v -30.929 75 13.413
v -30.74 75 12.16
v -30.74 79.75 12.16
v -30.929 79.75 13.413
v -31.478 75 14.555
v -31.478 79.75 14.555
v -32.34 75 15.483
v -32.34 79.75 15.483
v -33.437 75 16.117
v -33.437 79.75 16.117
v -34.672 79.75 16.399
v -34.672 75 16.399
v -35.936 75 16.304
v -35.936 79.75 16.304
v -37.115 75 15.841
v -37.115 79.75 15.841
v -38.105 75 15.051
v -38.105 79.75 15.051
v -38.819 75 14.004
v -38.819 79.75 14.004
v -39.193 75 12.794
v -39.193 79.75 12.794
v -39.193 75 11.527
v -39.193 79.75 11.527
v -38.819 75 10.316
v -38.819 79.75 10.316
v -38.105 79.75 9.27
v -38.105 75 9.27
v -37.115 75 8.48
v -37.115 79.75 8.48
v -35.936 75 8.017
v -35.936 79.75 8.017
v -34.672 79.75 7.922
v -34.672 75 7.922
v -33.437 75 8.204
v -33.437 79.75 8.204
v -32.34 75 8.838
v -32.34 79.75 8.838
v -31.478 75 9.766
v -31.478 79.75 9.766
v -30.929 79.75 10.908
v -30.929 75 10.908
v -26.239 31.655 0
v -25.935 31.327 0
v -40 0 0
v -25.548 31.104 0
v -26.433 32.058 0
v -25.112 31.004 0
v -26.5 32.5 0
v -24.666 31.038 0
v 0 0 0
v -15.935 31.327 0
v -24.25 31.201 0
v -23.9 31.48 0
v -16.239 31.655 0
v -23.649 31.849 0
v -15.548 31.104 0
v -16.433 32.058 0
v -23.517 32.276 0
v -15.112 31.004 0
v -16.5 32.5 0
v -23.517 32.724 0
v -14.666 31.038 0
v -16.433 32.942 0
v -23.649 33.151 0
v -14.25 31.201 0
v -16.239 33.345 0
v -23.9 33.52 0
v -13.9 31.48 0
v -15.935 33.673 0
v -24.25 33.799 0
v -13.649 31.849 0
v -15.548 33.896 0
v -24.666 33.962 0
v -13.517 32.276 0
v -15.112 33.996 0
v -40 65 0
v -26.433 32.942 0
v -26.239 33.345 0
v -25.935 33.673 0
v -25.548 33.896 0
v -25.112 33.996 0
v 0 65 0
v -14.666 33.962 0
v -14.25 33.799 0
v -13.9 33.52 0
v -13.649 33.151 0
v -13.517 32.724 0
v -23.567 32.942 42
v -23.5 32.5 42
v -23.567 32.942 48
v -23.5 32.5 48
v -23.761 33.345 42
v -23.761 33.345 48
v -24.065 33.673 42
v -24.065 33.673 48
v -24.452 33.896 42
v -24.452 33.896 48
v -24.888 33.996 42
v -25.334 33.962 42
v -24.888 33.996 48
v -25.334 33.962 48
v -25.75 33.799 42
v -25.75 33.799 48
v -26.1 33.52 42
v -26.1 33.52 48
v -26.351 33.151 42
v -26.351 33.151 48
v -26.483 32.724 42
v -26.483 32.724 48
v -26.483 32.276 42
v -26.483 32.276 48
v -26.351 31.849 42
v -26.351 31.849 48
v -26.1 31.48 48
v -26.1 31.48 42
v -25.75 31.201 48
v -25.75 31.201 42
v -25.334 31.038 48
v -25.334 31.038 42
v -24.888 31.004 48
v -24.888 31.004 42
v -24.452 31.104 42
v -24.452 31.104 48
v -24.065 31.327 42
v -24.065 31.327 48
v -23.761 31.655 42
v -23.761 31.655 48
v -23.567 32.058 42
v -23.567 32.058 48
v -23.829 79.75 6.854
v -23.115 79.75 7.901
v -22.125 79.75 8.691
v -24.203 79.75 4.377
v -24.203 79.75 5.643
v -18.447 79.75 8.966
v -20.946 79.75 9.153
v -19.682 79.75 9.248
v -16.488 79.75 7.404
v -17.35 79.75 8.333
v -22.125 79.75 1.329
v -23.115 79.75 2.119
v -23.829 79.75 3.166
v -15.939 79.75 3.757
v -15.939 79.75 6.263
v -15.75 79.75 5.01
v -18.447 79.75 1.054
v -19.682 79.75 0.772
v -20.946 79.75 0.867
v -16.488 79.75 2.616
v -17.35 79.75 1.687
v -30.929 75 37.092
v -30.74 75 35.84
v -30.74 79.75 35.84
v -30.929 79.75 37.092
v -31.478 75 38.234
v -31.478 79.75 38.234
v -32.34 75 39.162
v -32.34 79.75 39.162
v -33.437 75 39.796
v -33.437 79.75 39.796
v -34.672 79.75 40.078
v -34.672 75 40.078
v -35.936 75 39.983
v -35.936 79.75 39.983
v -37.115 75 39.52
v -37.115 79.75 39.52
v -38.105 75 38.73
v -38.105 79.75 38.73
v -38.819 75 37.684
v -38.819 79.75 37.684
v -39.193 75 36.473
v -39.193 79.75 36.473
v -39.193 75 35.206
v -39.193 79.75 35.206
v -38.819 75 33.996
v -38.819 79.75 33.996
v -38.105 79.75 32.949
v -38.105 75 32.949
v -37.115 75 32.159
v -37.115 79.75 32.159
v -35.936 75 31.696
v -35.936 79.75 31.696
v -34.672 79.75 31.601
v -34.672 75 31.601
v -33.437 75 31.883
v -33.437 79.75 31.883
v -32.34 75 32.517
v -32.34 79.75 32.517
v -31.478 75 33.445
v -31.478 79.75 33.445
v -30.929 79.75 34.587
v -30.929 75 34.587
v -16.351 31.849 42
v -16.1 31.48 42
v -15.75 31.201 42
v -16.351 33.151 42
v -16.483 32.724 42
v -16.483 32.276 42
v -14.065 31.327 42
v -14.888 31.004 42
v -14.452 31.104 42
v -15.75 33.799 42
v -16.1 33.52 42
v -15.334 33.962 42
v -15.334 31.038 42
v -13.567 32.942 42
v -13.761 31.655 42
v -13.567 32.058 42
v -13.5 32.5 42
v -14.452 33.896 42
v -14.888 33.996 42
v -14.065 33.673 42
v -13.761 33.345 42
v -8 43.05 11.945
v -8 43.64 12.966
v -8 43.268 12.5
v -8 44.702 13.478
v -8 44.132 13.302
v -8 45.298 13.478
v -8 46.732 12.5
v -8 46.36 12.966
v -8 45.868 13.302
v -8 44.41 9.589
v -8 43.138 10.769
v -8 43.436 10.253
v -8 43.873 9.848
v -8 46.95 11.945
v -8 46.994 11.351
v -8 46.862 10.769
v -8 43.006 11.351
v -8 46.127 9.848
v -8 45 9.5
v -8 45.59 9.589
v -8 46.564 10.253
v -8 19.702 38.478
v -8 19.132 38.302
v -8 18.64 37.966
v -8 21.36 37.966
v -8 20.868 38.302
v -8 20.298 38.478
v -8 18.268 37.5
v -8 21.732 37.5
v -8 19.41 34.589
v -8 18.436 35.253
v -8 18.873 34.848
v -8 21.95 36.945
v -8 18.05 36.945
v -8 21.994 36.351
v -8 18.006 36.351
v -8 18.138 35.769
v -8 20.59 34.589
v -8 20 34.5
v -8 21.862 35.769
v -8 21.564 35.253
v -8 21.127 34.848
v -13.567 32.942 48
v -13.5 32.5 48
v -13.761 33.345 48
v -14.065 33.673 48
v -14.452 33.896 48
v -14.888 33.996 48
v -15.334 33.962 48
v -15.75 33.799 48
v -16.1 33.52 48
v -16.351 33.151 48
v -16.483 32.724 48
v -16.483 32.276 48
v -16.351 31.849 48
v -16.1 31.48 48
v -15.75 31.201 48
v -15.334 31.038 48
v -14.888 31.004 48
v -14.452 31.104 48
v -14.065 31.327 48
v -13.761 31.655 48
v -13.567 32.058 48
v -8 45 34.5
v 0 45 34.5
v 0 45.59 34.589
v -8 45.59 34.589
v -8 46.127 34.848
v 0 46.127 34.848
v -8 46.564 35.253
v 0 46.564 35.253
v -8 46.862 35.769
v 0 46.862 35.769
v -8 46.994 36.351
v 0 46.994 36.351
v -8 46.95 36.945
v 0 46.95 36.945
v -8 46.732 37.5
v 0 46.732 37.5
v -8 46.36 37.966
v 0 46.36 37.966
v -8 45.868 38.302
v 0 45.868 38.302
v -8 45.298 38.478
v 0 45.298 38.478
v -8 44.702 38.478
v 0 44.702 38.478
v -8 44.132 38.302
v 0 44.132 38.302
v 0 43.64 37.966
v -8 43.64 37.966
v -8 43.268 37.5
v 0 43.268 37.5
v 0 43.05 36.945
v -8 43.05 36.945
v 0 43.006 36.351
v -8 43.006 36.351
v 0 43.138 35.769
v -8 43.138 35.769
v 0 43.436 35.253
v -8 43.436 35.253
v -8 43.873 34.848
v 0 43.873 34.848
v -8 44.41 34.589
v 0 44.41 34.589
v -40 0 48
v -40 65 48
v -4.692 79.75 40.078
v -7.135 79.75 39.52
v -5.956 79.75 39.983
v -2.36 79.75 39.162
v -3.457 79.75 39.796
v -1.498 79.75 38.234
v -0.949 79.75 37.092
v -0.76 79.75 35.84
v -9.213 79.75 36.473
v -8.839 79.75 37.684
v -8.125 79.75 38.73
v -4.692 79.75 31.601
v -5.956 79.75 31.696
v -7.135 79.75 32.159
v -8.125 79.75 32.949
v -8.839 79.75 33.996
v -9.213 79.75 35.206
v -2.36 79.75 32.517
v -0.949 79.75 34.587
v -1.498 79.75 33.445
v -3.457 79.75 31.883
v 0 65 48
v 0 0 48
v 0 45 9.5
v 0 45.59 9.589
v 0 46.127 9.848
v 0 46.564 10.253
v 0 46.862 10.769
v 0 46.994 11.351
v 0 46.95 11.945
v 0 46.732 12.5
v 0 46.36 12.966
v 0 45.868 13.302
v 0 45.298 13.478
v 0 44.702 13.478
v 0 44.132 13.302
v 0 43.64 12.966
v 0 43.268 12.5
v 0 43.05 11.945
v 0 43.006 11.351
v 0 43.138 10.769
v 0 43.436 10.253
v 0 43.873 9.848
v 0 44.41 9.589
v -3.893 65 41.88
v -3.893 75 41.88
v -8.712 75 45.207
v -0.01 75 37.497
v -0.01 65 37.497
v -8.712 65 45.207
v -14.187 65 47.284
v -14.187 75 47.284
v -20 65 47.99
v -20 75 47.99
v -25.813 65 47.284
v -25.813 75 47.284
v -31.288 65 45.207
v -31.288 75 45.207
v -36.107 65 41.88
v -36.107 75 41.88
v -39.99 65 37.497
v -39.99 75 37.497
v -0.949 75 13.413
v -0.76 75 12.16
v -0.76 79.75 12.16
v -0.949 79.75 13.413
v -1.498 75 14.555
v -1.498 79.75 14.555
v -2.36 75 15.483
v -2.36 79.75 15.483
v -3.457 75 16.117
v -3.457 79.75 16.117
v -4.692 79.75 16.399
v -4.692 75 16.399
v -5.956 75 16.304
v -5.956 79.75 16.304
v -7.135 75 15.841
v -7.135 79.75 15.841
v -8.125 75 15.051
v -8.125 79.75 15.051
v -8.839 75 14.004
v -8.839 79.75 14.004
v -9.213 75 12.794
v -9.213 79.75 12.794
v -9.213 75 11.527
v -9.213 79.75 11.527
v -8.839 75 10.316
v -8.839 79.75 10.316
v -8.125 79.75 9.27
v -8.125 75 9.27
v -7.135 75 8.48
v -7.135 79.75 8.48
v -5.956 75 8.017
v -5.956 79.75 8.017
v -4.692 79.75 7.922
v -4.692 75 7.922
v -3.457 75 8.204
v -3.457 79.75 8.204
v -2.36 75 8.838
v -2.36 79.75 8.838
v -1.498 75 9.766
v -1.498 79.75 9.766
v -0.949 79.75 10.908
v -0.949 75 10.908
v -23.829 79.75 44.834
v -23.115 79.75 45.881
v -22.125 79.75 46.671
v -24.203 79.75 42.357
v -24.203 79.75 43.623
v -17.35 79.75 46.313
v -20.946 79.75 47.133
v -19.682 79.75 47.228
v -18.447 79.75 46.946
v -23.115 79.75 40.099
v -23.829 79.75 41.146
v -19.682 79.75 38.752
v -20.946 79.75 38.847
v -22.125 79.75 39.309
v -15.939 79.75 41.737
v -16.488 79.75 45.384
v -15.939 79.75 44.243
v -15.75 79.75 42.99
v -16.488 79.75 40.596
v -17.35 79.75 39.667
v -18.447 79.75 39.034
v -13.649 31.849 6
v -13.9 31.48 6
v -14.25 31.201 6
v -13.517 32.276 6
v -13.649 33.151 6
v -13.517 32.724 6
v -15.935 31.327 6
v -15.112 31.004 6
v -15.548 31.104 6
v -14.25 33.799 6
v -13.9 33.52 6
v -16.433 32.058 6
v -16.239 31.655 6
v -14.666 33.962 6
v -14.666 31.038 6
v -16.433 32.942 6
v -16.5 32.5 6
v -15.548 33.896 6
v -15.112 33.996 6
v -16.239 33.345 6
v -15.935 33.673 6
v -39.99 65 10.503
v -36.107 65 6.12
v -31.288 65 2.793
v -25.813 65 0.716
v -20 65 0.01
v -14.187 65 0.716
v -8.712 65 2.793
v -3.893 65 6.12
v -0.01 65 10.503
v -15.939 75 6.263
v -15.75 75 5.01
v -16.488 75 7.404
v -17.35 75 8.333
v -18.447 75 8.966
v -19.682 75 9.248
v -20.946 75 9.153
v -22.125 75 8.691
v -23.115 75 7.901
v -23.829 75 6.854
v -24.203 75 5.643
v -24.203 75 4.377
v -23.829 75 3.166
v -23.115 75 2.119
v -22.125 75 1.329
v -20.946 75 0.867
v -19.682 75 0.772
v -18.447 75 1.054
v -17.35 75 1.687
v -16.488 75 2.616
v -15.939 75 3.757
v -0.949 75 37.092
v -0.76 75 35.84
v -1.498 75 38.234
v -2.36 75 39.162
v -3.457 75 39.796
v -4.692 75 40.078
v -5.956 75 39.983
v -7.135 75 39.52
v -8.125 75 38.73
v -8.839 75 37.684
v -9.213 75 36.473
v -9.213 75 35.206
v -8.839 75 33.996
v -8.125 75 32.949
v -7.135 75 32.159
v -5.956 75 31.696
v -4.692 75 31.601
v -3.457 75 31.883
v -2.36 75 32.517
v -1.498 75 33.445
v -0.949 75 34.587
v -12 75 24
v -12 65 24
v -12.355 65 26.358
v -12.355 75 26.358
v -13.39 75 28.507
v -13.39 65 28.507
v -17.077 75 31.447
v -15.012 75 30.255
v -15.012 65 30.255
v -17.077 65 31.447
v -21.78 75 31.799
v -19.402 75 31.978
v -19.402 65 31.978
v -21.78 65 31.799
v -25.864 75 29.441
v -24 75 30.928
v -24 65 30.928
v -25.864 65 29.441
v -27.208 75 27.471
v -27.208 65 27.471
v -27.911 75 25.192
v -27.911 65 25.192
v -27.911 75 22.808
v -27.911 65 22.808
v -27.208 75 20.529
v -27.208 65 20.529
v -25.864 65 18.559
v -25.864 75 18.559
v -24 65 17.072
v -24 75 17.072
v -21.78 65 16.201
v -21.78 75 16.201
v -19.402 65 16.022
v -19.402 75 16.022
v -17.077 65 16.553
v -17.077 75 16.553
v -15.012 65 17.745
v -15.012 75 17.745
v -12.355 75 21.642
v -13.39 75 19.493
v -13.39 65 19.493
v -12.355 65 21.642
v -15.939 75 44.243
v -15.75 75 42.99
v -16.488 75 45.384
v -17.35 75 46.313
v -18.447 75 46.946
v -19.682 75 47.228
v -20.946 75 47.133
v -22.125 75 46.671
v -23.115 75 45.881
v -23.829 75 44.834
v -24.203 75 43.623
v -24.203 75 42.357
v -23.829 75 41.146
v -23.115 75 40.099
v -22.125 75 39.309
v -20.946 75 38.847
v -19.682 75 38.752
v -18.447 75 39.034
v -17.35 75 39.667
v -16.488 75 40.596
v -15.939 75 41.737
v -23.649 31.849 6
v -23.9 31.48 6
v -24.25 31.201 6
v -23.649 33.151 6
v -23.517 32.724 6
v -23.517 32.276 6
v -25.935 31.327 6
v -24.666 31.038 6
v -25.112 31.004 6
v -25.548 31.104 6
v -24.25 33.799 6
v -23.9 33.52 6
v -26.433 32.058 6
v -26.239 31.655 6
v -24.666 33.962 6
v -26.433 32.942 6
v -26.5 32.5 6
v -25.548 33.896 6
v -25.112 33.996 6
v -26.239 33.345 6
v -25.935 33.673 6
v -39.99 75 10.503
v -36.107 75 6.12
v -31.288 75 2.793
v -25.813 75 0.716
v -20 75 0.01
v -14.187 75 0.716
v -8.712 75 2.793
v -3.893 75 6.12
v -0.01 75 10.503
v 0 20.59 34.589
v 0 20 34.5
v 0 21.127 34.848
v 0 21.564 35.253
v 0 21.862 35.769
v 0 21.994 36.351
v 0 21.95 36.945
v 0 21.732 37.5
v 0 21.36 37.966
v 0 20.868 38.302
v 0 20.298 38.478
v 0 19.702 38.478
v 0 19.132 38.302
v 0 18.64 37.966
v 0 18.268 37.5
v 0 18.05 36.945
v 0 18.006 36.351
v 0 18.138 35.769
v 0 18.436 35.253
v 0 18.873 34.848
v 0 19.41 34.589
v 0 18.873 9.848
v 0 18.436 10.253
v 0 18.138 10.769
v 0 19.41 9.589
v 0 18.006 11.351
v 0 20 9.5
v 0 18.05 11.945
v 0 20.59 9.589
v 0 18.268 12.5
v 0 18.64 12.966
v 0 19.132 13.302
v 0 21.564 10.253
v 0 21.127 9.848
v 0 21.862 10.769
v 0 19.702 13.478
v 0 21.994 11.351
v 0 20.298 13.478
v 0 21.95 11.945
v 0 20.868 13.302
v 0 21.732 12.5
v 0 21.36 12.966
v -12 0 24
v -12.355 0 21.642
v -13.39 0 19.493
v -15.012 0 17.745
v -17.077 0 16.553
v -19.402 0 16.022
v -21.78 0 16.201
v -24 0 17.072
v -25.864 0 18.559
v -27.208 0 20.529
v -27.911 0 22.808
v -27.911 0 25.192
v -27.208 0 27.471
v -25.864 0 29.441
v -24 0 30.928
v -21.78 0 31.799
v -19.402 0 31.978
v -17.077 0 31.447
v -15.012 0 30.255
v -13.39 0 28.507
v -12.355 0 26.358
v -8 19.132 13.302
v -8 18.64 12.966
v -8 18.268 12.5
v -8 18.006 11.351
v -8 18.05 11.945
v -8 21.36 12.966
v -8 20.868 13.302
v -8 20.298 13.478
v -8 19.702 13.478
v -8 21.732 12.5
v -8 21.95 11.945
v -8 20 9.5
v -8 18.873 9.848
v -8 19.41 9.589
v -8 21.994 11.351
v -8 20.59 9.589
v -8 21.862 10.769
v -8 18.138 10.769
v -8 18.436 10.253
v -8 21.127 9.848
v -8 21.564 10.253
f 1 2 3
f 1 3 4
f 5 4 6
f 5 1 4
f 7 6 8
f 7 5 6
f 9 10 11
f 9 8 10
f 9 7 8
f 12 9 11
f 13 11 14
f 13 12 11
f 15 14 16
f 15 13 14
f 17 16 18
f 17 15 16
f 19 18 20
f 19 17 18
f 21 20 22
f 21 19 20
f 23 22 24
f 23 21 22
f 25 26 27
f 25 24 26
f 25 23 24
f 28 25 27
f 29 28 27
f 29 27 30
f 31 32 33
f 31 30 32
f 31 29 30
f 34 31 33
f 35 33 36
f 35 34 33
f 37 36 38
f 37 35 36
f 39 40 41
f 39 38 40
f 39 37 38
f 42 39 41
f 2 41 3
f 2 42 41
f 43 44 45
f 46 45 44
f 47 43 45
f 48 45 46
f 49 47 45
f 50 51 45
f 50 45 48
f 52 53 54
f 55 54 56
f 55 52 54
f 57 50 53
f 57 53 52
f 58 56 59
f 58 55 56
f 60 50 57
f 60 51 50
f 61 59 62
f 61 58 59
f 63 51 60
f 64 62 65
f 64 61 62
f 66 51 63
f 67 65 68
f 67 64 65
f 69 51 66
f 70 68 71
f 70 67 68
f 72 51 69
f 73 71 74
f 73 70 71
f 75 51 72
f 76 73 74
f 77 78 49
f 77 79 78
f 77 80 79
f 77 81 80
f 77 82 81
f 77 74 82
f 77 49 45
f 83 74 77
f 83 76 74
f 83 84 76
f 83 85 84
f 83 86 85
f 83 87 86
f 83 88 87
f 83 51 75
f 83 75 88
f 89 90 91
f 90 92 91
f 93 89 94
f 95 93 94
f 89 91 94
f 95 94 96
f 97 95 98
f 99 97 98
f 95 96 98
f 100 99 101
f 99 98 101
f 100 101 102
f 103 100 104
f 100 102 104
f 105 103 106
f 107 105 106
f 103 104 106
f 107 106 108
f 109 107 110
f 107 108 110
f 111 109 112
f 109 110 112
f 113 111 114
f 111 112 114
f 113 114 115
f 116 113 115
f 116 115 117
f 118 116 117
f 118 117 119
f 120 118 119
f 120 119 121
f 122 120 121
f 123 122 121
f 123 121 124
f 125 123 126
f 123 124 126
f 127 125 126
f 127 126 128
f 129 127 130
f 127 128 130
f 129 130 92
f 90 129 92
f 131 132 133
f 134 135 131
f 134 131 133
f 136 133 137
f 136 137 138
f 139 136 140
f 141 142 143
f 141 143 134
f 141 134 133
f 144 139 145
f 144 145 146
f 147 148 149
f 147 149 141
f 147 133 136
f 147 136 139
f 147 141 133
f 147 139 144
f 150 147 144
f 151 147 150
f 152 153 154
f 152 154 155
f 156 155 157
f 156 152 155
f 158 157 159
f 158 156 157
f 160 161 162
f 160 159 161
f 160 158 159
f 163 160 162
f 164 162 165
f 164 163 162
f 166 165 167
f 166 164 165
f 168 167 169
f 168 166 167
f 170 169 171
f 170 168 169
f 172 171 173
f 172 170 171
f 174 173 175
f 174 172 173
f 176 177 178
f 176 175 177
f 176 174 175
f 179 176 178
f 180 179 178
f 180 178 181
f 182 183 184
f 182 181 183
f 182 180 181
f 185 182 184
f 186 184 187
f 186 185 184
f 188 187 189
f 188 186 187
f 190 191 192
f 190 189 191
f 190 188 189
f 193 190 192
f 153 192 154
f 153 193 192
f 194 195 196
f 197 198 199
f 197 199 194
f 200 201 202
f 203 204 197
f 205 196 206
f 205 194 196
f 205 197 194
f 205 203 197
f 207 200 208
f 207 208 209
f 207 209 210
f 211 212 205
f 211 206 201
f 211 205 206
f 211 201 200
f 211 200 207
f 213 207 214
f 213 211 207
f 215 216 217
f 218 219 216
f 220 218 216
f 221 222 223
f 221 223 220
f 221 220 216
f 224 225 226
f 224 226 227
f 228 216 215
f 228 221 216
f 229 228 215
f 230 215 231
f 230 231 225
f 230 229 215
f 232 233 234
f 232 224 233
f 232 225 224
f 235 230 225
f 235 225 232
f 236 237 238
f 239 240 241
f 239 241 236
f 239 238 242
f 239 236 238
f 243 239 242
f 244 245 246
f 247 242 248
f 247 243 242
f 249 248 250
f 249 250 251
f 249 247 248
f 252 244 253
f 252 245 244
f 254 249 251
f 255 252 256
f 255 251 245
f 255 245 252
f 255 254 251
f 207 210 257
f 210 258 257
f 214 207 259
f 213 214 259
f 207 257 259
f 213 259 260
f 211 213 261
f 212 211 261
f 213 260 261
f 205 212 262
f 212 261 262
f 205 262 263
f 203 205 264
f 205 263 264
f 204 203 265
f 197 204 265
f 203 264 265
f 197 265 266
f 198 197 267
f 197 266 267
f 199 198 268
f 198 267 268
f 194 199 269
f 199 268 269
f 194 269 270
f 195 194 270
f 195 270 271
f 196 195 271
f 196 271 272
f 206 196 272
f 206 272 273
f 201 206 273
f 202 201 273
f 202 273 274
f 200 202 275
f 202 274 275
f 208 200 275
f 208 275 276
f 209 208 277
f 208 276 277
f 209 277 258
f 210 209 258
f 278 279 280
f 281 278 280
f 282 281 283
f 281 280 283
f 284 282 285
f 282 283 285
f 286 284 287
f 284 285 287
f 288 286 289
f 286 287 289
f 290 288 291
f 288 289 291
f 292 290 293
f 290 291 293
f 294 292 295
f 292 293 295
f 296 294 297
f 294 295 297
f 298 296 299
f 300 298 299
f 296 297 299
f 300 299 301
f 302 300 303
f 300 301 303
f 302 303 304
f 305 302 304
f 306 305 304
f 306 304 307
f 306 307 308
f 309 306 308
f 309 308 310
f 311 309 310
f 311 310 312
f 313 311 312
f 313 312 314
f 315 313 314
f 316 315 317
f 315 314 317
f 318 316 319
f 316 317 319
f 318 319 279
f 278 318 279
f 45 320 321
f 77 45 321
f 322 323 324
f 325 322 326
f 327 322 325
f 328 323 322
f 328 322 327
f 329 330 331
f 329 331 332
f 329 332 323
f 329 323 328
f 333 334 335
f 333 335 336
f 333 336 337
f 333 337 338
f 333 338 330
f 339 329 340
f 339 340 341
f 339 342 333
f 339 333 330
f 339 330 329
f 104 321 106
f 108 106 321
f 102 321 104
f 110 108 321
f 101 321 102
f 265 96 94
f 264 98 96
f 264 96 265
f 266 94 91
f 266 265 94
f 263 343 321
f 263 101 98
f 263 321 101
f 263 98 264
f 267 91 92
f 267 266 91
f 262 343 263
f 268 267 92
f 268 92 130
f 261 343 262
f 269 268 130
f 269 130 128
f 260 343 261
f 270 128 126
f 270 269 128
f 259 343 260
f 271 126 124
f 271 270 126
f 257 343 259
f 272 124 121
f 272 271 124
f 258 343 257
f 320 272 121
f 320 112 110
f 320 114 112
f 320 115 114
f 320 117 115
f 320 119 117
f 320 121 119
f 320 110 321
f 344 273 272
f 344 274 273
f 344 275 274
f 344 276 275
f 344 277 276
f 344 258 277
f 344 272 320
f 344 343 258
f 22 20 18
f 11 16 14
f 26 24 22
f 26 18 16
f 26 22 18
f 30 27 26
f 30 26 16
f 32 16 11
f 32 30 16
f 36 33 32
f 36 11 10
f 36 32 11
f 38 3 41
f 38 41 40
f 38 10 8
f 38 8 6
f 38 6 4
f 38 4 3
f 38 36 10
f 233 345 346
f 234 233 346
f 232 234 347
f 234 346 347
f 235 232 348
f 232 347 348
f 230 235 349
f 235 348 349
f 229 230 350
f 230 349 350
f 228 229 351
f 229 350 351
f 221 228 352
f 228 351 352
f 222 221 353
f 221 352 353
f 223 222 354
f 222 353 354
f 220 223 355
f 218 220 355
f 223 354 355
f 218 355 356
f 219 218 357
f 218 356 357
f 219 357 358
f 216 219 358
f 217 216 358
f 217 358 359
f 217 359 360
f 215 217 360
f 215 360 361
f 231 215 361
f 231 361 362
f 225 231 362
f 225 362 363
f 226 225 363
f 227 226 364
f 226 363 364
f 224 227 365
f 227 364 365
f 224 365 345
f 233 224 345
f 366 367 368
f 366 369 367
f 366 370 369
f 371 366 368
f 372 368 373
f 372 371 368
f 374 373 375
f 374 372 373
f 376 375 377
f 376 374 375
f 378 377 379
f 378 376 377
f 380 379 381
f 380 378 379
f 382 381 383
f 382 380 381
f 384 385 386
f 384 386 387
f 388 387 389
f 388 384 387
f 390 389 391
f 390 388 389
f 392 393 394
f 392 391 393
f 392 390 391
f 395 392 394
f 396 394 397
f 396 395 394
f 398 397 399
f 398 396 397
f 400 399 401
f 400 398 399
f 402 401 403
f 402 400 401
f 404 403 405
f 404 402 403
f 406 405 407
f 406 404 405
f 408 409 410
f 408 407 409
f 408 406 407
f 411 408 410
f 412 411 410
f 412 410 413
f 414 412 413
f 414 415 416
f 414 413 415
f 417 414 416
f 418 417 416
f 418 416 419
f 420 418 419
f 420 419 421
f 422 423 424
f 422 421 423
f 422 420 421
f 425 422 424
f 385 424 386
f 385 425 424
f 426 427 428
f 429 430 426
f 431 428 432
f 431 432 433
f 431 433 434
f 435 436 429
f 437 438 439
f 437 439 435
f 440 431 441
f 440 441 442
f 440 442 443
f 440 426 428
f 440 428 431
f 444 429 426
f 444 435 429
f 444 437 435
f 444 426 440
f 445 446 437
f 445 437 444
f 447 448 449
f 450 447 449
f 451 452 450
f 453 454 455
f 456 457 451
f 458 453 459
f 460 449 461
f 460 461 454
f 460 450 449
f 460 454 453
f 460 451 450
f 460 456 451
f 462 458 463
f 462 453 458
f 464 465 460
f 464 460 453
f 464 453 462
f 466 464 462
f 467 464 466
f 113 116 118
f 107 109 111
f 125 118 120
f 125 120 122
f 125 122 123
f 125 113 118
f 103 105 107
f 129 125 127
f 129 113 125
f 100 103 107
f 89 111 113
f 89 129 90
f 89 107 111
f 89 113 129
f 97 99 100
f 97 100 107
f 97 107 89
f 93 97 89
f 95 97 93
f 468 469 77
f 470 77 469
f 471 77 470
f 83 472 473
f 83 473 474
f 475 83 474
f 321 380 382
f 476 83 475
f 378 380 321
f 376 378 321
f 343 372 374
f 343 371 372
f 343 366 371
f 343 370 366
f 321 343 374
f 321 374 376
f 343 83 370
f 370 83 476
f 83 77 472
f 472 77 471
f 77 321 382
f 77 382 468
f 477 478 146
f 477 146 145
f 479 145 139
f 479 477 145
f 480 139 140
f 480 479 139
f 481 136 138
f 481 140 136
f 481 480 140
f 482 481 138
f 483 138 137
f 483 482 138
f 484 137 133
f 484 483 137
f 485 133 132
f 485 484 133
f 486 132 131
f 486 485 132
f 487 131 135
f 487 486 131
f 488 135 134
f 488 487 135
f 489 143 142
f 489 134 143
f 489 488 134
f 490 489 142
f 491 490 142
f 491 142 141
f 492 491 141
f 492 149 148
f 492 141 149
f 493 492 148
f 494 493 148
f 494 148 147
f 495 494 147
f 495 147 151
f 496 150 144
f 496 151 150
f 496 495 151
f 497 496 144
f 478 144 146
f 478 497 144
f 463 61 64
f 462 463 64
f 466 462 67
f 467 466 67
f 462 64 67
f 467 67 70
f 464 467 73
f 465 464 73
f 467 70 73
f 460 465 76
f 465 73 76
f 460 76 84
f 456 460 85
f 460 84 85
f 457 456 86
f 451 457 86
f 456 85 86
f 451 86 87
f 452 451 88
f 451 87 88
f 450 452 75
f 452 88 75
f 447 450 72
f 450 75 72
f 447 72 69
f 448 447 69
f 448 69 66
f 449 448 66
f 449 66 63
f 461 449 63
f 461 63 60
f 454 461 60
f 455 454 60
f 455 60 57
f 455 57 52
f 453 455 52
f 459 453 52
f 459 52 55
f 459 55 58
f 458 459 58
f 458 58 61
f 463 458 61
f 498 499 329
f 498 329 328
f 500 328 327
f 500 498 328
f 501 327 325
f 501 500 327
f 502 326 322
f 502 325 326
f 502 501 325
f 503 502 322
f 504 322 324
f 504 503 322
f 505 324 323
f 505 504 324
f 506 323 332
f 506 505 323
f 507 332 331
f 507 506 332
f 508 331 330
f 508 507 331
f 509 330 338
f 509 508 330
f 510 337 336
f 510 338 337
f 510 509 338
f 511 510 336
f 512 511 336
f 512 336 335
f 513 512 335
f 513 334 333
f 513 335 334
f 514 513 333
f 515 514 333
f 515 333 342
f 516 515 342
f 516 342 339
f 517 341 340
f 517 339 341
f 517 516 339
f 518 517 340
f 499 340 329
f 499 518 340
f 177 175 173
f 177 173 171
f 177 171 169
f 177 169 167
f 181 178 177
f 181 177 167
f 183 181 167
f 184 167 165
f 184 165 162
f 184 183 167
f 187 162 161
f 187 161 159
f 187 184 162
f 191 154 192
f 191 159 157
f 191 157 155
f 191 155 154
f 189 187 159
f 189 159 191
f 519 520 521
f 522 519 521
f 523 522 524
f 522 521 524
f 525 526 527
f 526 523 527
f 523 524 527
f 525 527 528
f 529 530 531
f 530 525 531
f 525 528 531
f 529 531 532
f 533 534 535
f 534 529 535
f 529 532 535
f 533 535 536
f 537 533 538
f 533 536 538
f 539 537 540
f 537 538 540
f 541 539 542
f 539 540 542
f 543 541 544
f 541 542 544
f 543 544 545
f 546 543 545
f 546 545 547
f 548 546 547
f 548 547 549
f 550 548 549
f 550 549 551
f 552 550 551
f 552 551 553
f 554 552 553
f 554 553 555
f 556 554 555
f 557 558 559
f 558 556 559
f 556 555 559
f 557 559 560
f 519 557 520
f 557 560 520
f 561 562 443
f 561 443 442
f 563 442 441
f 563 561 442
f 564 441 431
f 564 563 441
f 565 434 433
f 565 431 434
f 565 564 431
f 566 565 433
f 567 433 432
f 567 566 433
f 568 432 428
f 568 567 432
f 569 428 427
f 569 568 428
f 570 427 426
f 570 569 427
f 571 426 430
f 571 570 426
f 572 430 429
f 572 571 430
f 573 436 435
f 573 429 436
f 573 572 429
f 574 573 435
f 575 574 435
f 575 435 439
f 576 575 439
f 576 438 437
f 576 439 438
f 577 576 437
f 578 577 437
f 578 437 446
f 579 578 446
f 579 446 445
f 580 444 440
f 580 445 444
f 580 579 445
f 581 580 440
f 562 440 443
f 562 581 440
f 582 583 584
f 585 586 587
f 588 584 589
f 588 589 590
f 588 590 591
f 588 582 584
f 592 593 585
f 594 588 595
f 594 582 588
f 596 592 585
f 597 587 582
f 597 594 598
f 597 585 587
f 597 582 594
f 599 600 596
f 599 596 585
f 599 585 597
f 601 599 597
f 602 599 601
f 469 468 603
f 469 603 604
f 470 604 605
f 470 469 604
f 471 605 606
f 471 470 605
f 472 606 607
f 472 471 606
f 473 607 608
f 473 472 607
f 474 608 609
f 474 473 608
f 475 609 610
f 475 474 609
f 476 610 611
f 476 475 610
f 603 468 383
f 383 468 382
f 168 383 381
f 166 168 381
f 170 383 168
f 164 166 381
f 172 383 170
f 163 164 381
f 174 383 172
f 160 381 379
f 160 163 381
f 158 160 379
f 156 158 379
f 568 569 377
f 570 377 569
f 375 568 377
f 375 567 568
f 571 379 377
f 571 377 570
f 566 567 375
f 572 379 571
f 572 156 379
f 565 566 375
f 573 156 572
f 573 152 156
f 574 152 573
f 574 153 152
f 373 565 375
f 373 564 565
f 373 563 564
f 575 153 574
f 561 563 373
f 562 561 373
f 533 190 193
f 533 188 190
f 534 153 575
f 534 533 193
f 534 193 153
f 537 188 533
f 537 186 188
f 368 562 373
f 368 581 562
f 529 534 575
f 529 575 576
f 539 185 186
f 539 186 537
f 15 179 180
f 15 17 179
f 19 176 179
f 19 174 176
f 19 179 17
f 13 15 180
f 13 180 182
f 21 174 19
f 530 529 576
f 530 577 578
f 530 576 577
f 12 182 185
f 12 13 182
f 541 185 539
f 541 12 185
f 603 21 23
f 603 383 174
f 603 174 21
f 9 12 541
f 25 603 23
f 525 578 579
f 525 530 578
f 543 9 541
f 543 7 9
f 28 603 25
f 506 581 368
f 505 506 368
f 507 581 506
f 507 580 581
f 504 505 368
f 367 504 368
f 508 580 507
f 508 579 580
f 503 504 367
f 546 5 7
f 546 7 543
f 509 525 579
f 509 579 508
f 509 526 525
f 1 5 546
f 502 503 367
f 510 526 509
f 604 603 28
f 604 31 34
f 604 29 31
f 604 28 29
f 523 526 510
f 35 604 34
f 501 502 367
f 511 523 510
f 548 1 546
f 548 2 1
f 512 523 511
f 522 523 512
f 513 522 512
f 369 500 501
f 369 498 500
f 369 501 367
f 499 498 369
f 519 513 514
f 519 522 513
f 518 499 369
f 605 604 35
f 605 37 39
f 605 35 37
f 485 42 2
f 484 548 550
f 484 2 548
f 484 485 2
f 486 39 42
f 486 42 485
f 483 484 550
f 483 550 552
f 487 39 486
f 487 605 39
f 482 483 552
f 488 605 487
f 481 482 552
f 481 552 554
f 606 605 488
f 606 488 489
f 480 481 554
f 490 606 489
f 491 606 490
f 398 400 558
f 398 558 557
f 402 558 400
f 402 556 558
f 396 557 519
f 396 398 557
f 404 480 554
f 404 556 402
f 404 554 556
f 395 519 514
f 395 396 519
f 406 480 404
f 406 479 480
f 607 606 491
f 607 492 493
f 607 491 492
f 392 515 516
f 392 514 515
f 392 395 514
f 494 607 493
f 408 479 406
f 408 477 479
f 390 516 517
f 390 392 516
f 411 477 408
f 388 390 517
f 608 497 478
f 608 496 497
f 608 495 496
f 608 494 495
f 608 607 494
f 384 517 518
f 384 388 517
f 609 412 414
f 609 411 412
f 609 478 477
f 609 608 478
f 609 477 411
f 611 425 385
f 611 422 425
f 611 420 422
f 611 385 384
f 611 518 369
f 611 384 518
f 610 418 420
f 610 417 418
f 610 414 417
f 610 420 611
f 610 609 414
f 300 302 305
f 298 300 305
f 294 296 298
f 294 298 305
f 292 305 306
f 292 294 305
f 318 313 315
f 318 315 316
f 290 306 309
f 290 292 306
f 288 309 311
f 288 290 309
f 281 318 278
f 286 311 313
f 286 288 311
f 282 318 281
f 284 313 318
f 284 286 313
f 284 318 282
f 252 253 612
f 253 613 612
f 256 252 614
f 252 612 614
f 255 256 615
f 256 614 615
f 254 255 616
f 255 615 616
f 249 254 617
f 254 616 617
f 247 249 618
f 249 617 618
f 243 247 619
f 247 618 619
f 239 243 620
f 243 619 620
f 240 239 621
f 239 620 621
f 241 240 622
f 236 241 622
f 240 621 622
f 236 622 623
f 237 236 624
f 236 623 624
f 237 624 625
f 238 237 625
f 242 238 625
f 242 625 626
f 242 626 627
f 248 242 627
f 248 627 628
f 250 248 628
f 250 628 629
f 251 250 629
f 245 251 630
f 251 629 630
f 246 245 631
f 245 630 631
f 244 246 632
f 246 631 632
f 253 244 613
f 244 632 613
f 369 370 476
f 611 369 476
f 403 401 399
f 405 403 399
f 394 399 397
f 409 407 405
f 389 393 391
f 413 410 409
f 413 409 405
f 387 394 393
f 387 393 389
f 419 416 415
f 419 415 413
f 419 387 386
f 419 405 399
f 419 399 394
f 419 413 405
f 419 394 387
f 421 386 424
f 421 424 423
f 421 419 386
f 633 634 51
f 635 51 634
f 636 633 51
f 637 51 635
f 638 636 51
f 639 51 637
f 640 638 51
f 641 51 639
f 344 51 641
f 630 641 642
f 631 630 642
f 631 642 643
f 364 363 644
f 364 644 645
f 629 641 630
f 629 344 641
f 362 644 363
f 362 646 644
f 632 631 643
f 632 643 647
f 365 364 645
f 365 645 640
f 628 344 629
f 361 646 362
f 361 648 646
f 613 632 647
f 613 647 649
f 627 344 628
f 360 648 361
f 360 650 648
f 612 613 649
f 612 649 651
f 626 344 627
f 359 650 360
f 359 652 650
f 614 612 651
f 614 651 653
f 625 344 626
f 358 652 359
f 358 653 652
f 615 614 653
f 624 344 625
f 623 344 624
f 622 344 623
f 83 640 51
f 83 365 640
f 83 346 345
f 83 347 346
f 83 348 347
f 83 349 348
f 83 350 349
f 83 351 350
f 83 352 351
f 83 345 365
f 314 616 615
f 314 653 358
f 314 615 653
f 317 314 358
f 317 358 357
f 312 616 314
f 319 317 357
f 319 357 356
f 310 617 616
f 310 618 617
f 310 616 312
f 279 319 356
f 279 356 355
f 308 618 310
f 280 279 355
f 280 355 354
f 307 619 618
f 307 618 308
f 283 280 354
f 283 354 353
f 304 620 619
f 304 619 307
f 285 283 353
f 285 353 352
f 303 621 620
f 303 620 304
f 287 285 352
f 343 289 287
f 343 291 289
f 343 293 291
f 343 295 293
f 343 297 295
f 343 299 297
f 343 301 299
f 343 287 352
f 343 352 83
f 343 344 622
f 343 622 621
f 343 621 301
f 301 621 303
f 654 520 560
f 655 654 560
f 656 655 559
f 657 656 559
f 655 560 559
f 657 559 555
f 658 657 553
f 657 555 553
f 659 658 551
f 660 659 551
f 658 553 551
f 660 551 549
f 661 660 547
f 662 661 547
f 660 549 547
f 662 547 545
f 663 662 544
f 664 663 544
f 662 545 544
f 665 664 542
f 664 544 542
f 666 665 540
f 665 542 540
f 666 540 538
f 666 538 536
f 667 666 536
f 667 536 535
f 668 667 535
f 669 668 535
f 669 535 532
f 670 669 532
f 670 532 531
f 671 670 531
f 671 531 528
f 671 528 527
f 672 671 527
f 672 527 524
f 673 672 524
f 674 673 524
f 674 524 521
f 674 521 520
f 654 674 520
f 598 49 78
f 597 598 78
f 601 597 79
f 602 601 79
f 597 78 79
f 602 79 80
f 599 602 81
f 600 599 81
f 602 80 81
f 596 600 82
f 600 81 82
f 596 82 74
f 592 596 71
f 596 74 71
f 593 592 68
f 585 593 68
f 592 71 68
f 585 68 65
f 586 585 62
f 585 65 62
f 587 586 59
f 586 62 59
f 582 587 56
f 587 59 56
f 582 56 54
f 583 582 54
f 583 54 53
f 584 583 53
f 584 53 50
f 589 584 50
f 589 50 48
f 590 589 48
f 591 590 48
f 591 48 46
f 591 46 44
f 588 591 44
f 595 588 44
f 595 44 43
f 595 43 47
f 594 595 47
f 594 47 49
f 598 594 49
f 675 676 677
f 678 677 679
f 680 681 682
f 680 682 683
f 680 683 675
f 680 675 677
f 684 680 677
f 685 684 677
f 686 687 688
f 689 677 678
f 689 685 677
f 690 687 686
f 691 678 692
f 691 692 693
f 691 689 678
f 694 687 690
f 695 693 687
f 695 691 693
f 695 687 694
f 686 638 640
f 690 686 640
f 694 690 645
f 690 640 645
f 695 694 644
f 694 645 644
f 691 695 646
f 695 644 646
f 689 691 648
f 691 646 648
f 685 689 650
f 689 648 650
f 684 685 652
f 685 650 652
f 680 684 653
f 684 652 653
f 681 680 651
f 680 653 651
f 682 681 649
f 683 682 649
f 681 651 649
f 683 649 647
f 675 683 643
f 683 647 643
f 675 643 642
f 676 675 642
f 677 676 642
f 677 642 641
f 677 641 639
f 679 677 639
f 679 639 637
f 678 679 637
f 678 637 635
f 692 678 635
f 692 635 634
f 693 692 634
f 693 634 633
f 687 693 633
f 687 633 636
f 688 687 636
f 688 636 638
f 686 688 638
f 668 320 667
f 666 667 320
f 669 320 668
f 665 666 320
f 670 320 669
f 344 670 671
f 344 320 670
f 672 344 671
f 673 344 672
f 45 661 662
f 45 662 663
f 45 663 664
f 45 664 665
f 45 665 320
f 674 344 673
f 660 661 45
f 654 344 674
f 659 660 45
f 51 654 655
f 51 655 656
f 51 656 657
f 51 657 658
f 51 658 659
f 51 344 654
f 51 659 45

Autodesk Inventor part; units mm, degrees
ref_plane "YZ Plane" through (0, 0, 0) normal (1, 0, 0) x (0, 1, 0)
ref_plane "XZ Plane" through (0, 0, 0) normal (0, 1, 0) x (-1, 0, 0)
ref_plane "XY Plane" through (0, 0, 0) normal (0, 0, 1) x (1, 0, 0)
sketch "Sketch1" plane through (0, 0, 0) normal (1, 0, 0) x (0, 1, 0)
  line L0 (0, 0) -> (65, 0)
  line L1 (65, 0) -> (65, 48)
  line L2 (65, 48) -> (0, 48)
  line L3 (0, 48) -> (0, 0)
  dimension "d0" = 65
  dimension "d1" = 48
extrude "Extrusion1" add sketch "Sketch1" against normal blind 40
sketch "Sketch2" plane through (0, 0, 0) normal (1, 0, 0) x (0, 0, -1)
  line L0 (-36.5, 45) -> (-11.5, 45) construction
  line L1 (-11.5, 45) -> (-11.5, 20) construction
  line L2 (-11.5, 20) -> (-36.5, 20) construction
  line L3 (-36.5, 20) -> (-36.5, 45) construction
  line L4 (-36.5, 45) -> (-36.5, 65) construction
  line L5 (-48, 65) -> (0, 65) construction
  line L6 (-36.5, 45) -> (-48, 45) construction
  line L7 (-48, 0) -> (-48, 65) construction
  line L8 (-11.5, 20) -> (-11.5, 0) construction
  line L9 (0, 0) -> (-48, 0) construction
  line L10 (-11.5, 20) -> (0, 20) construction
  circle A0 centre (-36.5, 45) radius 2
  circle A1 centre (-11.5, 45) radius 2
  circle A2 centre (-11.5, 20) radius 2
  circle A3 centre (-36.5, 20) radius 2
  line L11 (0, 0) -> (0, 65) projected
  dimension "d4" = 25
  dimension "d5" = 25
  dimension "d6" = 4
  dimension "d7" = 4
  dimension "d8" = 4
  dimension "d9" = 4
extrude "Extrusion2" cut sketch "Sketch2" against normal blind 8
sketch "Sketch3" plane through (0, 0, 48) normal (0, 0, 1) x (1, 0, 0)
  line L0 (0, 65) -> (0, 0) construction
  line L1 (0, 32.5) -> (-40, 32.5) construction
  line L2 (-40, 0) -> (-40, 65) construction
  line L3 (-25, 32.5) -> (-15, 32.5) construction
  circle A0 centre (-25, 32.5) radius 1.5
  circle A1 centre (-15, 32.5) radius 1.5
  dimension "d12" = 10
  dimension "d13" = 15
  dimension "d14" = 3
  dimension "d15" = 3
extrude "Extrusion3" cut sketch "Sketch3" against normal blind 6
sketch "Sketch4" plane through (0, 0, 0) normal (0, 0, -1) x (-1, 0, 0)
  circle A0 centre (25, 32.5) radius 1.5 projected
  circle A1 centre (15, 32.5) radius 1.5 projected
  point P0 (0, 0)
extrude "Extrusion4" cut sketch "Sketch4" against normal blind 6
thread "Thread1" size "M3x0.5" class "6H" standard "ANSI Metric M Profile" full length
thread "Thread2" size "M3x0.5" class "6H" standard "ANSI Metric M Profile" full length
thread "Thread3" size "M4x0.7" class "6H" standard "ANSI Metric M Profile" full length
thread "Thread4" size "M4x0.7" class "6H" standard "ANSI Metric M Profile" full length
thread "Thread5" size "M4x0.7" class "6H" standard "ANSI Metric M Profile" full length
thread "Thread6" size "M4x0.7" class "6H" standard "ANSI Metric M Profile" full length
thread "Thread7" size "M3x0.5" class "6H" standard "ANSI Metric M Profile" full length
thread "Thread8" size "M3x0.5" class "6H" standard "ANSI Metric M Profile" full length
sketch "Sketch5" plane through (0, 65, 48) normal (0, 1, 0) x (1, 0, 0)
  line L0 (-40, 48) -> (-40, 0) projected
  line L1 (-40, 10.5) -> (-40, 37.5)
  line L2 (0, 0) -> (0, 48) projected
  line L3 (0, 10.5) -> (0, 37.5)
  line L4 (0, 38.5) -> (-8, 38.5) projected
  arc A0 (-40, 10.5) -> (0, 10.5) centre (-20, 24.2976) ccw
  arc A1 (0, 37.5) -> (-40, 37.5) centre (-20, 23.7024) ccw
  line L5 (-0.01, 10.5031) -> (-0.01, 37.4969)
  arc A2 (-0.01, 37.4969) -> (-39.99, 37.4969) centre (-20, 23.7024) ccw
  line L6 (-39.99, 37.4969) -> (-39.99, 10.5031)
  arc A3 (-39.99, 10.5031) -> (-0.01, 10.5031) centre (-20, 24.2976) ccw
  line L7 (-39.99, 24) -> (-0.01, 24) construction
  circle A4 centre (-20, 24) radius 8
  dimension "d36" = 27
  dimension "d37" = 10.5
  dimension "d38" = 0.01
  dimension "d39" = 16
extrude "Extrusion5" add sketch "Sketch5" along normal blind 10 contours A2 L5 A3 L6
sketch "Sketch6" plane through (0, 75, 48) normal (0, 1, 0) x (1, 0, 0)
  arc A0 (-0.01, 37.4969) -> (-39.99, 37.4969) centre (-20, 23.7024) ccw projected
  line L0 (-39.99, 37.4969) -> (-39.99, 10.5031) projected
  arc A1 (-39.99, 10.5031) -> (-0.01, 10.5031) centre (-20, 24.2976) ccw projected
  line L1 (-0.01, 10.5031) -> (-0.01, 37.4969) projected
  circle A2 centre (-20, 24) radius 8 projected
  arc A3 (-5.01, 35.8396) -> (-34.99, 35.8396) centre (-20, 23.7024) ccw construction
  line L2 (-5.01, 35.8396) -> (-5.01, 12.1604) construction
  arc A4 (-34.99, 12.1604) -> (-5.01, 12.1604) centre (-20, 24.2976) ccw construction
  line L3 (-34.99, 12.1604) -> (-34.99, 35.8396) construction
  circle A5 centre (-34.99, 35.8396) radius 4.25
  circle A6 centre (-20, 42.99) radius 4.25
  circle A7 centre (-5.01, 35.8396) radius 4.25
  circle A8 centre (-5.01, 12.1604) radius 4.25
  circle A9 centre (-20, 5.01) radius 4.25
  circle A10 centre (-34.99, 12.1604) radius 4.25
  point P0 (0, 48)
  dimension "d42" = 5
  dimension "d43" = 8.5
  dimension "d44" = 8.5
  dimension "d45" = 8.5
  dimension "d46" = 8.5
  dimension "d47" = 8.5
  dimension "d48" = 8.5
extrude "Extrusion6" add sketch "Sketch6" along normal blind 4.75 contours A5 | A6 | A7 | A8 | A9 | A10
sketch "Sketch7" plane through (-20, 65, 24) normal (0, 1, 0) x (1, 0, 0)
  circle A0 centre (0, 0) radius 8 projected
  point P0 (20, 24)
extrude "Extrusion7" cut sketch "Sketch7" against normal up to next
equation "\"d7\" = d6"
equation "\"d8\" = d6"
equation "\"d9\" = d6"
equation "\"d15\" = d14"
equation "\"d44\" = d43"
equation "\"d45\" = d43"
equation "\"d46\" = d43"
equation "\"d47\" = d43"
equation "\"d48\" = d43"
properties part number "Z Axis Statonary Block"
